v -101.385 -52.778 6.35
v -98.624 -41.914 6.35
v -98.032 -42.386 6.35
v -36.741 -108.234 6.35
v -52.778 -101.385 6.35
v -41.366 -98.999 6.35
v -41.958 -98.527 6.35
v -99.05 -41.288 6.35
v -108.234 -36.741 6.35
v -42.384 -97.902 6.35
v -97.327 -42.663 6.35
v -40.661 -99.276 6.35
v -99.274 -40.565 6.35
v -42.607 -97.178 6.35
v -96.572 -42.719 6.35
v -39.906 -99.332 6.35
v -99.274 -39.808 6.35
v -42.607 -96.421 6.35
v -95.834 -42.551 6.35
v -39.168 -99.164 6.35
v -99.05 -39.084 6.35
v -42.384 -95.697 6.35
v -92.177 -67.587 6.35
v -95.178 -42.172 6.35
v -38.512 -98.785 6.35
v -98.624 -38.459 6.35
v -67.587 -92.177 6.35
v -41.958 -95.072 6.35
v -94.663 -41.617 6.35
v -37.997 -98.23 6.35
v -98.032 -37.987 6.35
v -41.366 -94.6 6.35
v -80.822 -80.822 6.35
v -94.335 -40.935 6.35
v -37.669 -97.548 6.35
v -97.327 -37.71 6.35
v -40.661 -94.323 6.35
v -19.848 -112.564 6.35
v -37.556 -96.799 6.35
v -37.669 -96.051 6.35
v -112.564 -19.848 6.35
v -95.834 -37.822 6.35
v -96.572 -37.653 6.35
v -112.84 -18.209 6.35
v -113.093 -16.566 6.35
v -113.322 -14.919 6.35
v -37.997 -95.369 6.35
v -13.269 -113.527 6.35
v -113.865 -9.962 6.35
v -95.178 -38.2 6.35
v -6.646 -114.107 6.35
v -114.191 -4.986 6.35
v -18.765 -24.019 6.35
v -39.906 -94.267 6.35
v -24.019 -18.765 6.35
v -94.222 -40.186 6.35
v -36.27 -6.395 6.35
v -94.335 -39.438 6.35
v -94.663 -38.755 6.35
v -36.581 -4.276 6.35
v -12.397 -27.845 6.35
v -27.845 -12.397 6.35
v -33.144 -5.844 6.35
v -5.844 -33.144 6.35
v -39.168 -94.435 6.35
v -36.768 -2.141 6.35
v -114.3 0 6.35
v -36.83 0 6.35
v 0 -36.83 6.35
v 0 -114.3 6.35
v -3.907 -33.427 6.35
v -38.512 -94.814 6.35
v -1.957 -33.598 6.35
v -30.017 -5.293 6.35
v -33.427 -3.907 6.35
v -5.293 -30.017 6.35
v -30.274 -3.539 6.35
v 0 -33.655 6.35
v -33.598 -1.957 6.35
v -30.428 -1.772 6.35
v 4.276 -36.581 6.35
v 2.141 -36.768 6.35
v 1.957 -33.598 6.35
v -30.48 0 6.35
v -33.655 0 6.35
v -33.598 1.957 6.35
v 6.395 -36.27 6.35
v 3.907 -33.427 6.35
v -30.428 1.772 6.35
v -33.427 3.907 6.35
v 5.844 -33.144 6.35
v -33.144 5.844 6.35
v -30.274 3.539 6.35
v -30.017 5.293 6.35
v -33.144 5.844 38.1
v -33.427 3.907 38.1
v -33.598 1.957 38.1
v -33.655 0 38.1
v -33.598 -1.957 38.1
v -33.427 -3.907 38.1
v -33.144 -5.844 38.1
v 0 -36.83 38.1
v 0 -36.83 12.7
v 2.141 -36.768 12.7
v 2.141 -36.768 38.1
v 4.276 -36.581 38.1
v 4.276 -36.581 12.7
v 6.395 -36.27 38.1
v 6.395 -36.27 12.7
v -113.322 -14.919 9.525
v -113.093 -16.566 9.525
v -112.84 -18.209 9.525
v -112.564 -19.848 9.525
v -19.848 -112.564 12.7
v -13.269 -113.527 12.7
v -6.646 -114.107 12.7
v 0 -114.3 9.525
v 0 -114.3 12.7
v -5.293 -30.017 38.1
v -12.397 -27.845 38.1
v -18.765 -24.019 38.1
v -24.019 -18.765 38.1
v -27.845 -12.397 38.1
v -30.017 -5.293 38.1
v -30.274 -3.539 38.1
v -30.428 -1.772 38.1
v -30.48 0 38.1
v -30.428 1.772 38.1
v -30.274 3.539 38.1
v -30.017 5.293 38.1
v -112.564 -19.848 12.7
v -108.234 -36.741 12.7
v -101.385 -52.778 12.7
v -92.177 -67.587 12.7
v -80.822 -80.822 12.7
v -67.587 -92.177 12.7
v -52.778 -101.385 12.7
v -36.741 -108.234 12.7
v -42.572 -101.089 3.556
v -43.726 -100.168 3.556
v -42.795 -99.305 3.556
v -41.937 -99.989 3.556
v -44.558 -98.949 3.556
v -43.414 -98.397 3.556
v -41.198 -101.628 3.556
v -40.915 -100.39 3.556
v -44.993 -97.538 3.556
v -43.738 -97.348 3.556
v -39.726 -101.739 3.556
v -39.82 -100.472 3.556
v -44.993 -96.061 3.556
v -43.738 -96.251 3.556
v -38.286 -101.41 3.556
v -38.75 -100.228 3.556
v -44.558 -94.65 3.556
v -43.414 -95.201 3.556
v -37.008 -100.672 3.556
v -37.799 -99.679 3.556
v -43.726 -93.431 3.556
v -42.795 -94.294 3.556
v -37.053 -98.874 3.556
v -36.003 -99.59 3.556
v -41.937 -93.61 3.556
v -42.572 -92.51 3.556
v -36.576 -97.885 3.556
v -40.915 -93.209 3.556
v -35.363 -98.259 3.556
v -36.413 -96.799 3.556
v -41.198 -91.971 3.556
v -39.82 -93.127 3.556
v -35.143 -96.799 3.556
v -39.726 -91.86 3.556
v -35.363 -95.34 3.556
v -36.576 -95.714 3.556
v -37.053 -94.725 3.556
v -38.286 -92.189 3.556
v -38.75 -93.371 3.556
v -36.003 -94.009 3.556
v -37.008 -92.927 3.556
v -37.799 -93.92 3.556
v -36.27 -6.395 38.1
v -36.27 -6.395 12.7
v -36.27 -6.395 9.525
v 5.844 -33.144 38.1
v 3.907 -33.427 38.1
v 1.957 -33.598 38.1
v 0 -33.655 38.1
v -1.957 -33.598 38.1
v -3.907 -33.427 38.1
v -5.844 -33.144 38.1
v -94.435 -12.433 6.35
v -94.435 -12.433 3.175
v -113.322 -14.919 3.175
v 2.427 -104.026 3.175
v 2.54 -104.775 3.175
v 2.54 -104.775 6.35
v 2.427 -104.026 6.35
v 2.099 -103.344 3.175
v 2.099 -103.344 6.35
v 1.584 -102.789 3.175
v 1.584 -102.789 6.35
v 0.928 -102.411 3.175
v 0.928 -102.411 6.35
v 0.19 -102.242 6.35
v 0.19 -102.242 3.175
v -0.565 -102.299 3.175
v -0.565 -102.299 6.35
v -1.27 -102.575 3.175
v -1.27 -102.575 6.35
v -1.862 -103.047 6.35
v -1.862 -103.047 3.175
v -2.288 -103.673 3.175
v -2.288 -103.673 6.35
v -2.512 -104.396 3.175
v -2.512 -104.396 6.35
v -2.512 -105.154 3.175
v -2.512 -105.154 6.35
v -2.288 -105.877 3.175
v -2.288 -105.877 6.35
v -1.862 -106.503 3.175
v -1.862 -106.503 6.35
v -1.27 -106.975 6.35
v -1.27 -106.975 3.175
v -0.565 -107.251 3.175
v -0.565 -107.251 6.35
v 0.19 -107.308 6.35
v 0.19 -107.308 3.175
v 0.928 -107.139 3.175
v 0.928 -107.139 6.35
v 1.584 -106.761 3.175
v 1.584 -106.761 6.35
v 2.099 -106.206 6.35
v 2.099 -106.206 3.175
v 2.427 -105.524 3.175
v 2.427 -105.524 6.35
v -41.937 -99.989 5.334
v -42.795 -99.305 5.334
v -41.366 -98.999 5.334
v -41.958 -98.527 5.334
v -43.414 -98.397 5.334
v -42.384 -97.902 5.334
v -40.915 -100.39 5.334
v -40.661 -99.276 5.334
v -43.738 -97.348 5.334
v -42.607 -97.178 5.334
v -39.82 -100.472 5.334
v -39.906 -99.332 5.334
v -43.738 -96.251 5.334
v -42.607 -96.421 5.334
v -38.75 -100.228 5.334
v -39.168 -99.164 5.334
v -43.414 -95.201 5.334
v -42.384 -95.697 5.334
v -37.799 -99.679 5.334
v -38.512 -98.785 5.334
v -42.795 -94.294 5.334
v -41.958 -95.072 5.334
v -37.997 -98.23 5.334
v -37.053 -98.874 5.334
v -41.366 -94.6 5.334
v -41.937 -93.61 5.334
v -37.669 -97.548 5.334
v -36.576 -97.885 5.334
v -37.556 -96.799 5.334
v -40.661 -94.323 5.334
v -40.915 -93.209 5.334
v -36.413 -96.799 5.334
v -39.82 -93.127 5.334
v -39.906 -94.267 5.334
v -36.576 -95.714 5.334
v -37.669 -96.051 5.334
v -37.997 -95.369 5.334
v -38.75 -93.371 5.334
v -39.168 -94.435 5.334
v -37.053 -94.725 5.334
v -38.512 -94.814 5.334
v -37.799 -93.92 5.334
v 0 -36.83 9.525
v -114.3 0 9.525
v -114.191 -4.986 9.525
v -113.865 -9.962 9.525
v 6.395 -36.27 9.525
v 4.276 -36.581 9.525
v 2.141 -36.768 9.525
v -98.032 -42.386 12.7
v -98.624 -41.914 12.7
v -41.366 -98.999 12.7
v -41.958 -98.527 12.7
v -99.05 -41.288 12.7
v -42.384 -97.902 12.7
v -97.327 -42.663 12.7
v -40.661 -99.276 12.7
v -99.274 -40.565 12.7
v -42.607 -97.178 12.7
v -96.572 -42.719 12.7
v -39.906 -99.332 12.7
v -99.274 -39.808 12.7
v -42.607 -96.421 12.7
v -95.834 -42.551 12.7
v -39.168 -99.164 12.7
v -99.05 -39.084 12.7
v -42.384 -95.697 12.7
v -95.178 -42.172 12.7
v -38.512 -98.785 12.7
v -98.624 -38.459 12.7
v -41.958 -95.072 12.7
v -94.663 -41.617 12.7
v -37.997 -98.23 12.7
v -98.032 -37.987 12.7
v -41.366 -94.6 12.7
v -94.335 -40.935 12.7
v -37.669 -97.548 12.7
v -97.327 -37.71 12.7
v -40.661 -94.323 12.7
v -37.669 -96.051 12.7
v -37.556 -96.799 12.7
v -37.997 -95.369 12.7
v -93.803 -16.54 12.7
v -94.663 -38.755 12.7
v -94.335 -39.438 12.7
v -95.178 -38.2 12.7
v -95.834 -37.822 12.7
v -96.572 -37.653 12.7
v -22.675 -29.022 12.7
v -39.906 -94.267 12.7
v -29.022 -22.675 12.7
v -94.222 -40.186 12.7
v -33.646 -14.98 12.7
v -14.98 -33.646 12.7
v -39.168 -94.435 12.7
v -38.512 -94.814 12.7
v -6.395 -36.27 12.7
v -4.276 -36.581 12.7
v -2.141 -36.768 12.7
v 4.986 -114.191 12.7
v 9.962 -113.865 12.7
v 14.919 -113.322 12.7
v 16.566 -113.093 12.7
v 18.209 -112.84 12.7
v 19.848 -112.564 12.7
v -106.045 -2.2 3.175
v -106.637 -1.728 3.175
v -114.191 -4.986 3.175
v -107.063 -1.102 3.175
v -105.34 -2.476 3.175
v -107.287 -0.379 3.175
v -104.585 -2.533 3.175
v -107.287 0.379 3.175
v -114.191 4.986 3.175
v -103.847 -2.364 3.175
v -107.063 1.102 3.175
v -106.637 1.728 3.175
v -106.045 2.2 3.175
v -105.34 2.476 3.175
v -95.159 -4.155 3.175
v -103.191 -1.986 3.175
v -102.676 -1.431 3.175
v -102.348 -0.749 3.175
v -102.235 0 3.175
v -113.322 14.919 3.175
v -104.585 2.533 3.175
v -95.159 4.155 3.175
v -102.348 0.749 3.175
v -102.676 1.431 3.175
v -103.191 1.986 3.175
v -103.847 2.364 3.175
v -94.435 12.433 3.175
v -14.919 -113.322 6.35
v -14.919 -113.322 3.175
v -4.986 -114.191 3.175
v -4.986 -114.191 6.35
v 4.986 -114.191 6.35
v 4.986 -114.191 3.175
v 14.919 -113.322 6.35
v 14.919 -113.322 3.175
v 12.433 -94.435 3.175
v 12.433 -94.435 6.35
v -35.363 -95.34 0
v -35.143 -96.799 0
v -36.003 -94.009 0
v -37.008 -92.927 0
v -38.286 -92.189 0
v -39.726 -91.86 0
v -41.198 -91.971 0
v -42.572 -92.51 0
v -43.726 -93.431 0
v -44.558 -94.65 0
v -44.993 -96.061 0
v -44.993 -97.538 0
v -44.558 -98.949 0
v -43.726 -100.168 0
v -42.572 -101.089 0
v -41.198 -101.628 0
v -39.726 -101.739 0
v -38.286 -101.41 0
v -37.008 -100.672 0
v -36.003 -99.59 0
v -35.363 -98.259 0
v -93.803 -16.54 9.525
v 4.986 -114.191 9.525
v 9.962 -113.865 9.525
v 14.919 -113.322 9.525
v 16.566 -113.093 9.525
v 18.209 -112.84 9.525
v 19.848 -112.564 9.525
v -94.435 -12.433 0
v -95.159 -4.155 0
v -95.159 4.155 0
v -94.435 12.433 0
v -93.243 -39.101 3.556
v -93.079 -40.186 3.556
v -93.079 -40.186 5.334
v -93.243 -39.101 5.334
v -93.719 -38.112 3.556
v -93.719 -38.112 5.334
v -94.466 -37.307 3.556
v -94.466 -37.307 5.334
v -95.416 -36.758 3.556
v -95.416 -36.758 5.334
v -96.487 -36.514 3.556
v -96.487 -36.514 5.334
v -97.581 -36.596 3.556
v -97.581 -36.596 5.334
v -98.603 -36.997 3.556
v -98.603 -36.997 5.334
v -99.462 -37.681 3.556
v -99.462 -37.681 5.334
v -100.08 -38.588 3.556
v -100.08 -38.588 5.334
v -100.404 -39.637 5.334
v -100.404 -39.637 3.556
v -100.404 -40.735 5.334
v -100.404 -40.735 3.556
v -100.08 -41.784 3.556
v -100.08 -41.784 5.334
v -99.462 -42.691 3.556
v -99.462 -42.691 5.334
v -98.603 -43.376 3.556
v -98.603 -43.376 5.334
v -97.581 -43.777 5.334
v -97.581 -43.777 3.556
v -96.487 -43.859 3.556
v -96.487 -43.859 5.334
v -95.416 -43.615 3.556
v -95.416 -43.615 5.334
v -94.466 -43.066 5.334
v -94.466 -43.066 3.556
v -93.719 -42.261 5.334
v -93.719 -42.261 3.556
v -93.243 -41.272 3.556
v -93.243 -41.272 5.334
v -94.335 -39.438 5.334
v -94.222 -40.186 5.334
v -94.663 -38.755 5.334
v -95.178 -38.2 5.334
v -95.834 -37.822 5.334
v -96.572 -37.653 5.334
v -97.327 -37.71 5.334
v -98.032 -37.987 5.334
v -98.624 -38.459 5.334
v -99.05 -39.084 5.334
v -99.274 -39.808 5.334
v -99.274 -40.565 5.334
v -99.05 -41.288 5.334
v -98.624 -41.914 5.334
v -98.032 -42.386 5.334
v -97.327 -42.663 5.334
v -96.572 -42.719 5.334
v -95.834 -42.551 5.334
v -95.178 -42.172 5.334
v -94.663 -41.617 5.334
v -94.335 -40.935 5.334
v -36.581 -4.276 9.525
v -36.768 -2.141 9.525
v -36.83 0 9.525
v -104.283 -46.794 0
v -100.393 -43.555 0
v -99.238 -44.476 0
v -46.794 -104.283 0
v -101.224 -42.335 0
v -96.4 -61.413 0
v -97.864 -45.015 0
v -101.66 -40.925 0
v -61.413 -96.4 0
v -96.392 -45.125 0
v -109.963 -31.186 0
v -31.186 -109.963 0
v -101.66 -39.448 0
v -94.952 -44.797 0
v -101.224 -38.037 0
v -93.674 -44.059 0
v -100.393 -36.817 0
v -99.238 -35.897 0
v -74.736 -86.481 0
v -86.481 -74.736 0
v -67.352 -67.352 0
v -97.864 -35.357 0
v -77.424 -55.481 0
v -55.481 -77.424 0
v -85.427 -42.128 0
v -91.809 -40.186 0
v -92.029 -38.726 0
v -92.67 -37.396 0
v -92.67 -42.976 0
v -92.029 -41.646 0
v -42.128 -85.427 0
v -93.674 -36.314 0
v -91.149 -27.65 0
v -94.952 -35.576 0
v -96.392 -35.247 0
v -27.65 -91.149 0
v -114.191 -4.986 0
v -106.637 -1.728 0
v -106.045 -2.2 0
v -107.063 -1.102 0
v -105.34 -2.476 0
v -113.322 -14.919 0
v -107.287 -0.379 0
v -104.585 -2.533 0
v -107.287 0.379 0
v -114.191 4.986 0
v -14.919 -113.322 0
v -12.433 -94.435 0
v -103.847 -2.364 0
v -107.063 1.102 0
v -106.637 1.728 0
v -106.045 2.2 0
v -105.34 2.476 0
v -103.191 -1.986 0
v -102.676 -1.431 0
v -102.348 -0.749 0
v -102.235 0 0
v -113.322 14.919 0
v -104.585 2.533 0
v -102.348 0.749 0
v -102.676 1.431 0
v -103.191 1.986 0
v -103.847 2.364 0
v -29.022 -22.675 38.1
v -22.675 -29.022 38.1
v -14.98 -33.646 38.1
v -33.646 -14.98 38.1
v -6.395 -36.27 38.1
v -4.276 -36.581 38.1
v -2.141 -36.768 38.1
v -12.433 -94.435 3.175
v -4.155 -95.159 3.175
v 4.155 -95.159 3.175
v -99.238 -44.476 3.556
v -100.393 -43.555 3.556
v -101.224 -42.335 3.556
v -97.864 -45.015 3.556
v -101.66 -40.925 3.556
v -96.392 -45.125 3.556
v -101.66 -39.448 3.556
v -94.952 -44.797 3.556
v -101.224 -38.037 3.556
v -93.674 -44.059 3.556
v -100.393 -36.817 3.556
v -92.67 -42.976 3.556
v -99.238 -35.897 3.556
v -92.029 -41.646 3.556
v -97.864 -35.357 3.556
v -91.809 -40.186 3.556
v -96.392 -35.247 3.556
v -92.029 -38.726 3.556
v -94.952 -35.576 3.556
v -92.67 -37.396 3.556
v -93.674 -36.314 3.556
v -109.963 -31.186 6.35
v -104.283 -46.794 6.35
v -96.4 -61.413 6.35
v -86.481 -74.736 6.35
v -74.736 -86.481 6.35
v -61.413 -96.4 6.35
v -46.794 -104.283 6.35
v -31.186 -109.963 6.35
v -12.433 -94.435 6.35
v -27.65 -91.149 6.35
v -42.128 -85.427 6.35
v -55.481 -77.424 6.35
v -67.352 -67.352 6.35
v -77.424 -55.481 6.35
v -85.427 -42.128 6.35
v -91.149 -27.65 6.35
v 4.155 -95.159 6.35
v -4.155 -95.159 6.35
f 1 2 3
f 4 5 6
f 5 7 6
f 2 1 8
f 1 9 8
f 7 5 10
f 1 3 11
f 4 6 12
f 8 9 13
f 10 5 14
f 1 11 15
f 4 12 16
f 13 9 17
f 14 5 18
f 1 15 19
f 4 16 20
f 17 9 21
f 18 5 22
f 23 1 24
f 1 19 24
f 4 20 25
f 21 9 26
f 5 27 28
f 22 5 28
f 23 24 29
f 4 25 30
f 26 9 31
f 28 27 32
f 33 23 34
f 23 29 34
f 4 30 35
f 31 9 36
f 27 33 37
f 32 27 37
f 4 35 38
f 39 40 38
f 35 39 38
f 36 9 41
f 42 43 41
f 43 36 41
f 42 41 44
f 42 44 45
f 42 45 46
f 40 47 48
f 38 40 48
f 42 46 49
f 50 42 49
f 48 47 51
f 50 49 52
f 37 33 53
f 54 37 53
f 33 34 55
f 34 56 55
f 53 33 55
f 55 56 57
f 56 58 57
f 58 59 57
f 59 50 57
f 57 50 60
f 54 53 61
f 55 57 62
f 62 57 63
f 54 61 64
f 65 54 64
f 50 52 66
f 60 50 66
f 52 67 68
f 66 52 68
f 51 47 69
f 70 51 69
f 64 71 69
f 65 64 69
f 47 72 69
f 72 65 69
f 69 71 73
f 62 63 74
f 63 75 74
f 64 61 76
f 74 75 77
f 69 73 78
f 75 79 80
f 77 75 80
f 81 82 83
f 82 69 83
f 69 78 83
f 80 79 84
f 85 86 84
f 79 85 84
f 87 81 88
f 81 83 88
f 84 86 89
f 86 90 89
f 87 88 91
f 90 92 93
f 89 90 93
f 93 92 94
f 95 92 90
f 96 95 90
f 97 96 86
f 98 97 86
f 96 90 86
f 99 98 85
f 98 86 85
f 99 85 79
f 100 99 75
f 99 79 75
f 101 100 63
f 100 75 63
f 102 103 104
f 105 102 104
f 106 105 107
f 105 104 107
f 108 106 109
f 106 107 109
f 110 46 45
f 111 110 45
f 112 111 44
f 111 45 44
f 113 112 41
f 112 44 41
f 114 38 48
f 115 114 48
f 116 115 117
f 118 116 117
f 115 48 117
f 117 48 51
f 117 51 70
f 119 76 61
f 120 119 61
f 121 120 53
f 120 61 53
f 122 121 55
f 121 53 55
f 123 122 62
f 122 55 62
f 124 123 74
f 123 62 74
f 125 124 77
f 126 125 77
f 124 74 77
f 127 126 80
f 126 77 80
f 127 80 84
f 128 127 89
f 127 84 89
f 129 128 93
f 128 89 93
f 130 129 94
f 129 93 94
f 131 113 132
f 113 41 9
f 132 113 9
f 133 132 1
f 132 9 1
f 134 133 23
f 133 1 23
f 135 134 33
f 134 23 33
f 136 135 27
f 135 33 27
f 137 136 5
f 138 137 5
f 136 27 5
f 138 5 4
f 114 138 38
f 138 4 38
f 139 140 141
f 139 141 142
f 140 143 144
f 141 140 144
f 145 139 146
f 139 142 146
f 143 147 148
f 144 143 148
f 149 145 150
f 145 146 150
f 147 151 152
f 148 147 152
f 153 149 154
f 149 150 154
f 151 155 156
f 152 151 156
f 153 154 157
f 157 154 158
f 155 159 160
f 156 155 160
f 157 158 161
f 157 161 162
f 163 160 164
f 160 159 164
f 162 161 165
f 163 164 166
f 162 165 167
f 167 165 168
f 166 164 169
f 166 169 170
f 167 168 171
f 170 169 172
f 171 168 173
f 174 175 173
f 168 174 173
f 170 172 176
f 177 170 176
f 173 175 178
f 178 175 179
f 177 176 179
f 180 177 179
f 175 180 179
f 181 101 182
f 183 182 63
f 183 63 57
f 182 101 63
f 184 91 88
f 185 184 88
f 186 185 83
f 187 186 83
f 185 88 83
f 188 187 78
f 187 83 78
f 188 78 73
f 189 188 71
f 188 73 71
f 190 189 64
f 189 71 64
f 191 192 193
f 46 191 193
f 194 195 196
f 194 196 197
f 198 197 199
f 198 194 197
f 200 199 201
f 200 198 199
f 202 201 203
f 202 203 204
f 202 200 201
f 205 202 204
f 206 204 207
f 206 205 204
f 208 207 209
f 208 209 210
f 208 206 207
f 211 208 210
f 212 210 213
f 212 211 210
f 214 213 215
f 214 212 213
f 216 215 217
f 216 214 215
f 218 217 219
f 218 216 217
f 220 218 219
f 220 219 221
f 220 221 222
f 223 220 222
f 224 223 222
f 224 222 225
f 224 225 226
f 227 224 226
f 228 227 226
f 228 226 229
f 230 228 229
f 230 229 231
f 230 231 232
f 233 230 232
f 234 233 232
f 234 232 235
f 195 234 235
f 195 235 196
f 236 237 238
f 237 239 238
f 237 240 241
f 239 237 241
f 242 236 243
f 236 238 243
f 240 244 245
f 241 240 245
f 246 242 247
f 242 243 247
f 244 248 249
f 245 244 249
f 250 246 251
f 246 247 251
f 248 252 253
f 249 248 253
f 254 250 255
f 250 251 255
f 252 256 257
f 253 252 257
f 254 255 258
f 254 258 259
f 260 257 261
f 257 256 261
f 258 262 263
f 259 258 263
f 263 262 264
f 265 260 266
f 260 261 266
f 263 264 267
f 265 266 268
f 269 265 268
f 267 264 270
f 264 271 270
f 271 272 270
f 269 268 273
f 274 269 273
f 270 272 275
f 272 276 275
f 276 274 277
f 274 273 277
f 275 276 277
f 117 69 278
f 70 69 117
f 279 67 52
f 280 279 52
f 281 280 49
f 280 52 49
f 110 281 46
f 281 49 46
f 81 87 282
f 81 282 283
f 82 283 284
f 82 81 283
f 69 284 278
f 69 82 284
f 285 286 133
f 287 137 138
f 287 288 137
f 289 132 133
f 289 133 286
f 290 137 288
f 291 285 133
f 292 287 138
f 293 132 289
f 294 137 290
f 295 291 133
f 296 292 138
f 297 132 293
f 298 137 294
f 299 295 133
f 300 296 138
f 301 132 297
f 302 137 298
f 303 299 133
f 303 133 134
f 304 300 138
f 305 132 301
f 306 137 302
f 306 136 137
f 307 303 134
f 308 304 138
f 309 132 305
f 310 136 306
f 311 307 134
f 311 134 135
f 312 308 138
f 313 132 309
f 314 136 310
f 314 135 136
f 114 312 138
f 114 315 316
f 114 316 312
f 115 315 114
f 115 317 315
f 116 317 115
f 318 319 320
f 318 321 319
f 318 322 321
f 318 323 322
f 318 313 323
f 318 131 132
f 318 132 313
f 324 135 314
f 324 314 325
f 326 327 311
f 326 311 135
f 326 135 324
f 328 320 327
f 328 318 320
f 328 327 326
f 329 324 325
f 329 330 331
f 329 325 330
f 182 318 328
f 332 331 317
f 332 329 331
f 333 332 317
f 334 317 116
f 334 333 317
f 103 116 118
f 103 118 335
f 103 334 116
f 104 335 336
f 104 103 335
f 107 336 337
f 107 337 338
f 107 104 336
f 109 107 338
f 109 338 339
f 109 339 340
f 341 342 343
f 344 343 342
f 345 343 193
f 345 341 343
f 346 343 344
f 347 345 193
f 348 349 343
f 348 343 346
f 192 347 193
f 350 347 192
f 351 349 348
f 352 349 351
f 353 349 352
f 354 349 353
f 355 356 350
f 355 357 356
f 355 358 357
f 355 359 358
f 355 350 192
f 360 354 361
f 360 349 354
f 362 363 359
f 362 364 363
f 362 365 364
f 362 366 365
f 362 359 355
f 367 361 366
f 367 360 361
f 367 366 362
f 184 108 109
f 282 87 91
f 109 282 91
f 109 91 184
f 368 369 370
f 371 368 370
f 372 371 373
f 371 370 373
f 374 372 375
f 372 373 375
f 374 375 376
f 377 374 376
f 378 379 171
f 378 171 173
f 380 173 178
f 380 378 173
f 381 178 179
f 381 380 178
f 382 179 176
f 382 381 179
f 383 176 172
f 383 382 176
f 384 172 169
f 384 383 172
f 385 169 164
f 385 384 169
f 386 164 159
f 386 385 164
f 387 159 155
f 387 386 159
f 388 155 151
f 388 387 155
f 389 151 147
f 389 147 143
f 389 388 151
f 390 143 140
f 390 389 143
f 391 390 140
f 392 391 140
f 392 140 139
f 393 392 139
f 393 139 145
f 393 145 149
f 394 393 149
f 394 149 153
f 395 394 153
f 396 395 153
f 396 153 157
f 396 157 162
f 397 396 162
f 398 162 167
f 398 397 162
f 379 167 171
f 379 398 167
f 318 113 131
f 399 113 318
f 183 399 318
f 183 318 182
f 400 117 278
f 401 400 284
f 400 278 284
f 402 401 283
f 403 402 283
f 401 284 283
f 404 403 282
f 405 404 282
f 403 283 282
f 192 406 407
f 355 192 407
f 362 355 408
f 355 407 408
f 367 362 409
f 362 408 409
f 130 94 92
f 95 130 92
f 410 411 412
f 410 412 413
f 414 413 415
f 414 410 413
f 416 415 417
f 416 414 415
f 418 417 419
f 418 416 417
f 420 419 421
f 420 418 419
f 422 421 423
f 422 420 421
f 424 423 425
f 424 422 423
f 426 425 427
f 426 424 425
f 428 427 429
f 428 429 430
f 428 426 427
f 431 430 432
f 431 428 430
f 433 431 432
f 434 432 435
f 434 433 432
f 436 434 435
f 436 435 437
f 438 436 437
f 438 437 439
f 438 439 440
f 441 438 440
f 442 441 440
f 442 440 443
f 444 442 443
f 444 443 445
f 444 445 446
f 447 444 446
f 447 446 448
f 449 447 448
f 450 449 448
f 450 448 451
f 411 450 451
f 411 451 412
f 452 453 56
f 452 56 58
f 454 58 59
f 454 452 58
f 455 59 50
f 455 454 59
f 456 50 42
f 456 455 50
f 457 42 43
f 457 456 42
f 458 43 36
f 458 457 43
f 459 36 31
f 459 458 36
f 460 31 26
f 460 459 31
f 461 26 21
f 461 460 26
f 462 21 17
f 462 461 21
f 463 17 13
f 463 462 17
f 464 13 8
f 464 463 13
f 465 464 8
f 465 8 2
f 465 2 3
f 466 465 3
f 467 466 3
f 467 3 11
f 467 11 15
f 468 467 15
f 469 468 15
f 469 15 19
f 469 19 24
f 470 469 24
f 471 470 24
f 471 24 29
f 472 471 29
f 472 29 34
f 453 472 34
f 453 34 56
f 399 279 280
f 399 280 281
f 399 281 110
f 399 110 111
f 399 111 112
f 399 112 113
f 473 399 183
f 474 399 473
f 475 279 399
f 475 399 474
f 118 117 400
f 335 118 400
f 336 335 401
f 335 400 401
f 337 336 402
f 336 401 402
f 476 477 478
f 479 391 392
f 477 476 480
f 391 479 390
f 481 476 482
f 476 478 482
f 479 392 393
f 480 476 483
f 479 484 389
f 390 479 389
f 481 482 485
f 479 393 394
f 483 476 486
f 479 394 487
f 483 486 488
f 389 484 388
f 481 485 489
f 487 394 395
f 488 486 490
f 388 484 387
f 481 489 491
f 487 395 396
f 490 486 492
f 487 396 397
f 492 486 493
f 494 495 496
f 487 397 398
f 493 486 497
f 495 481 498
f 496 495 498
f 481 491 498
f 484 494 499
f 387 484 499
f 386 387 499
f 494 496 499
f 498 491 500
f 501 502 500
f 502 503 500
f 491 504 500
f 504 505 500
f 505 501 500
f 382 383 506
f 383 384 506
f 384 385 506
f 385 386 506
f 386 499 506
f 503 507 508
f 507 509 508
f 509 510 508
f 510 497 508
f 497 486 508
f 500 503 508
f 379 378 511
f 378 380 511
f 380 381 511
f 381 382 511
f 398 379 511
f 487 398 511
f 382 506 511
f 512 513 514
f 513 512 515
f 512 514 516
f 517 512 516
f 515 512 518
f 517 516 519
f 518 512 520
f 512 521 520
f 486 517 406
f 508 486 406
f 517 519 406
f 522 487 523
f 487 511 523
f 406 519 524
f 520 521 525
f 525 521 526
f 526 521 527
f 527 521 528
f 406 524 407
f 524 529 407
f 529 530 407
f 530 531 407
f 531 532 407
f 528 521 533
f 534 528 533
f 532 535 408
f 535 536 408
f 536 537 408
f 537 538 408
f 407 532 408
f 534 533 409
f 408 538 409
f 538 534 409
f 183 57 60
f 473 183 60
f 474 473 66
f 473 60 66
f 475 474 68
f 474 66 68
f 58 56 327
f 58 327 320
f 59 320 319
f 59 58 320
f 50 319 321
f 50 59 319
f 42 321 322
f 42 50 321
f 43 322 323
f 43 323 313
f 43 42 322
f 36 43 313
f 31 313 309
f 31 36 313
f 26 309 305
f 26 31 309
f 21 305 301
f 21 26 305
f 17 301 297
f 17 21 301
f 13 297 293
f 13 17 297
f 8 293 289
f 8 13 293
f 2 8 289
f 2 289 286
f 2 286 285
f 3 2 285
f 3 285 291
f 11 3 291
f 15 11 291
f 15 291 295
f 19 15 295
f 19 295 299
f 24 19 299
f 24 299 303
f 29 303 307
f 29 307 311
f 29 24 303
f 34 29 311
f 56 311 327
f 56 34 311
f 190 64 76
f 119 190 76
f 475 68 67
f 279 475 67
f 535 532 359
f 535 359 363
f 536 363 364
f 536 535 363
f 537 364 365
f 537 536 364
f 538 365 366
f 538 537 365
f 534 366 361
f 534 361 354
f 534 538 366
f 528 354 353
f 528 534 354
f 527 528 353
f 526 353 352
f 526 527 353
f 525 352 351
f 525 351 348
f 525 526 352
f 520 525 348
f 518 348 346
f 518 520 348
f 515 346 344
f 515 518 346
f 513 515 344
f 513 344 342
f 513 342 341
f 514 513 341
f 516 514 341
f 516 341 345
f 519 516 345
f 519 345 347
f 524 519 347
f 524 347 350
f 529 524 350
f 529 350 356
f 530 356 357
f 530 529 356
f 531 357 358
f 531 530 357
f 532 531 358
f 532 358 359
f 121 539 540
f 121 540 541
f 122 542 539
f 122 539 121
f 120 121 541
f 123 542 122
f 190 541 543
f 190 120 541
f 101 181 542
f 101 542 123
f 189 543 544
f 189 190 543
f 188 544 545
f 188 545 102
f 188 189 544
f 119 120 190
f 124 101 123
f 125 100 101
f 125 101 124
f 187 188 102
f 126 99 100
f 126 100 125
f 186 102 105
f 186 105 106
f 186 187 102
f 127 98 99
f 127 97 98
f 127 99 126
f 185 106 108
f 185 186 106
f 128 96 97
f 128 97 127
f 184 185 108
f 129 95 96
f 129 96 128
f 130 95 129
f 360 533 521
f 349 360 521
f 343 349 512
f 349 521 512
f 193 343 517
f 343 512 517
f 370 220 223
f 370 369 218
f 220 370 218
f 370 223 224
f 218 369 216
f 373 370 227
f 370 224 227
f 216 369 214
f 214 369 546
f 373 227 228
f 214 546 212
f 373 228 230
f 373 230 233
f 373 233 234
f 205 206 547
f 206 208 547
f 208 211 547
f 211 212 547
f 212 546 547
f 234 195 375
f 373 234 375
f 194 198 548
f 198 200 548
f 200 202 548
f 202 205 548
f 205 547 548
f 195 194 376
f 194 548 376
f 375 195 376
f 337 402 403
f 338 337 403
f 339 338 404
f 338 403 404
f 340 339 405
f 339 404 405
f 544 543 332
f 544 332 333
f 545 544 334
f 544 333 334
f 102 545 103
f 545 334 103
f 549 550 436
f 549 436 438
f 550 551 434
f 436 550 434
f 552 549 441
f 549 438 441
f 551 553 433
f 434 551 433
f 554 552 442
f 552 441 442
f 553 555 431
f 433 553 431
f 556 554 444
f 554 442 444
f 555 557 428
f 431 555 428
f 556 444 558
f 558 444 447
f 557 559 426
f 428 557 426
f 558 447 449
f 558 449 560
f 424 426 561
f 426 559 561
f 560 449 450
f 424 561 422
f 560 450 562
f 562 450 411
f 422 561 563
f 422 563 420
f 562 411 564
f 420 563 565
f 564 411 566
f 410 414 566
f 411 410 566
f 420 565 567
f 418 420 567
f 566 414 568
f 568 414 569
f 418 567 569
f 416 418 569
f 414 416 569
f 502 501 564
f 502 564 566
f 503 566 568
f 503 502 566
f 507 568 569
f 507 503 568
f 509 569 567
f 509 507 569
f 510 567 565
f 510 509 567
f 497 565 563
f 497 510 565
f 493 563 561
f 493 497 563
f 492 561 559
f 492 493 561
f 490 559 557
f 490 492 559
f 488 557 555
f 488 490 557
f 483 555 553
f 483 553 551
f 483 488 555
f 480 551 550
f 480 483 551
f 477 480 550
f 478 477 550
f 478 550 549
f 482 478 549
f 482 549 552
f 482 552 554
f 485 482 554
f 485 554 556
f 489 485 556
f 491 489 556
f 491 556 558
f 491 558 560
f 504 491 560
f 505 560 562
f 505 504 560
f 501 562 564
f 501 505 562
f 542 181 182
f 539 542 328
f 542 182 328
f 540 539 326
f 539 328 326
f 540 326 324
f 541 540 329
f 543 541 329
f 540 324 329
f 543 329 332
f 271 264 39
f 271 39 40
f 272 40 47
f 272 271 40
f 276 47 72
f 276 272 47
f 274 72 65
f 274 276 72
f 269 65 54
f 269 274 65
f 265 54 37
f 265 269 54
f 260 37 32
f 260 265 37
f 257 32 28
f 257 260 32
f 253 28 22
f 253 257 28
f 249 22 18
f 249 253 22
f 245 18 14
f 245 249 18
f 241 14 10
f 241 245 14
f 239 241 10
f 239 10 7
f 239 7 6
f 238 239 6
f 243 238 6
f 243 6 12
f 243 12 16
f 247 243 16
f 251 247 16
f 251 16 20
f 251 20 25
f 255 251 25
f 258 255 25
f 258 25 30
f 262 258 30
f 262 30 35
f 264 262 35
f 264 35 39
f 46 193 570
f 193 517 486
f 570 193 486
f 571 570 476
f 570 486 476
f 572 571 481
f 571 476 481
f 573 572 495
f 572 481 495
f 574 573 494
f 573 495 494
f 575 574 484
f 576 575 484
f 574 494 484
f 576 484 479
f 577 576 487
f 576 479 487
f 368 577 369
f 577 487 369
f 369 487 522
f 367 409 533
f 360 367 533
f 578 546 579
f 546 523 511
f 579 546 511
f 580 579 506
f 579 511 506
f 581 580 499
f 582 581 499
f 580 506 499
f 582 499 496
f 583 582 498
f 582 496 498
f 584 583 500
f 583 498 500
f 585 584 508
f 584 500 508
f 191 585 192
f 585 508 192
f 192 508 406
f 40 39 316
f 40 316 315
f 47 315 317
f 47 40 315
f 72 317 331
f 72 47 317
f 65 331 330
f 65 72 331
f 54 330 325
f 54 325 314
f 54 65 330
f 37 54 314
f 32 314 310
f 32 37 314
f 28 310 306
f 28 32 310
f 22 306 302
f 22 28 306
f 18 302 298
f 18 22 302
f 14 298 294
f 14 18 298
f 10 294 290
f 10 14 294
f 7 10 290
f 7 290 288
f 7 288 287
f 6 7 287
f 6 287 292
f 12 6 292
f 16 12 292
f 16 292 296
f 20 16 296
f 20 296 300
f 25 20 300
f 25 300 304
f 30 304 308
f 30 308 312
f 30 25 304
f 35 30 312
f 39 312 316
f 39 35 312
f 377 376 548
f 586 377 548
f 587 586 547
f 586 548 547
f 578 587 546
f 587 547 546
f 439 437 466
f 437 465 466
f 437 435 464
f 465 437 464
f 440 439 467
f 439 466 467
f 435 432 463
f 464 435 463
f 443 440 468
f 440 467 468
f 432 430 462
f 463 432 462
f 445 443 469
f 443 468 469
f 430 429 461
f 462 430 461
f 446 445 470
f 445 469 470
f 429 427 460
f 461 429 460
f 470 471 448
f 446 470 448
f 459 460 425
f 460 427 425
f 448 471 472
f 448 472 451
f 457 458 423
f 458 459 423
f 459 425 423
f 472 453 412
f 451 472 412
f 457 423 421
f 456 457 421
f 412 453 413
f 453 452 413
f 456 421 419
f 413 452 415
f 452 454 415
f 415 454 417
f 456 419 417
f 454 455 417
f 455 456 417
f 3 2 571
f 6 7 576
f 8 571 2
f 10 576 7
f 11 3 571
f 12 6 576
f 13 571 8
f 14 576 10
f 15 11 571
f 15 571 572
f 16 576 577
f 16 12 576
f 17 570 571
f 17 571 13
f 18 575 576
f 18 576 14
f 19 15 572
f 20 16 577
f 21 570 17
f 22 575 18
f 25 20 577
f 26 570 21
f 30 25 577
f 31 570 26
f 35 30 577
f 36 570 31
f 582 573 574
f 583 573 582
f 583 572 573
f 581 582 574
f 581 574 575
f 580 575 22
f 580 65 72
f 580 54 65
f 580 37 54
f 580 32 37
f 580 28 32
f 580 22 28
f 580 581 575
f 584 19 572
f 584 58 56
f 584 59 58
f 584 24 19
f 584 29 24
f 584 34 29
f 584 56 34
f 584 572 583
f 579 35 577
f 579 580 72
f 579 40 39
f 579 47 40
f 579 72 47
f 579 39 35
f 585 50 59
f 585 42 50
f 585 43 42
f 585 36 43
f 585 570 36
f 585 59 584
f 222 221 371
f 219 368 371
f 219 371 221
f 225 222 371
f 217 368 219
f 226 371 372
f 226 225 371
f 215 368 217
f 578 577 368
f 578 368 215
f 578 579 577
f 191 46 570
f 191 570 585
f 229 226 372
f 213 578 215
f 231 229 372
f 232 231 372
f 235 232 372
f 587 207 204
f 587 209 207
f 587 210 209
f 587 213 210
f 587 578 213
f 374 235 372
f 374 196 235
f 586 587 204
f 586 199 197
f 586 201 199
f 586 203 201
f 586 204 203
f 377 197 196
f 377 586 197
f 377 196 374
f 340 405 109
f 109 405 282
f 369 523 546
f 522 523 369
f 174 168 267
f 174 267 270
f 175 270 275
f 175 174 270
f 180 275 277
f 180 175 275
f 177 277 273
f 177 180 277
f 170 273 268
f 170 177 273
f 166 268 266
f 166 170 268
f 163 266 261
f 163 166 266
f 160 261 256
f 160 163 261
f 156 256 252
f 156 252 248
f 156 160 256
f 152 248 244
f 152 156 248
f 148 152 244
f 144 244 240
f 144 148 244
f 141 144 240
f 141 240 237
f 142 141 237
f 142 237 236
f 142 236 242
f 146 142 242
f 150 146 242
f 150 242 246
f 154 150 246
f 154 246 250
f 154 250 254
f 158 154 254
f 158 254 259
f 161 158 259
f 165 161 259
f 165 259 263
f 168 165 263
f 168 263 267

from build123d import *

# Parameters (mm, degrees)
F0_R      = 4.953
F0_R_2    = 3.683
F0_R_3    = 2.54
F1_DEPTH  = 6.35
F2_DEPTH  = 3.175
F3_DEPTH  = 6.35
F4_DEPTH  = 3.175
F5_DEPTH  = 3.556
F6_DEPTH  = 3.556
F7_DEPTH  = 5.334
F8_DEPTH  = 5.334
F9_DEPTH  = 25.4
F10_R     = 2.54
F11_DEPTH = 6.35
F12_DEPTH = 31.75
F13_DEPTH = 6.35
F14_DEPTH = 3.175
F15_DEPTH = 6.35
F16_DEPTH = 3.175


with BuildPart() as f1:
    # F0 (on Top) → F1 (new body)
    with BuildSketch(Plane.XY):
        with BuildLine():
            Line((-94.4351230459, -12.432619809), (-113.322147655, -14.9191437708))
            ThreePointArc((-113.322147655, -14.9191437708), (-80.8223050896, -80.8223050896), (-14.9191437708, -113.322147655))
            Line((-14.9191437708, -113.322147655), (-12.432619809, -94.4351230459))
            ThreePointArc((-12.432619809, -94.4351230459), (-67.351920908, -67.351920908), (-94.4351230459, -12.432619809))
        make_face()
        with Locations((-40.0956566261, -96.7994780189)):
            Circle(F0_R, mode=Mode.SUBTRACT)
        with Locations((-96.7618797455, -40.1863067863)):
            Circle(F0_R, mode=Mode.SUBTRACT)
        with Locations((-96.7618797455, -40.1863067863)):
            Circle(F0_R)
        with Locations((-96.7618797455, -40.1863067863)):
            Circle(F0_R_2, mode=Mode.SUBTRACT)
        with Locations((-96.7618797455, -40.1863067863)):
            Circle(F0_R_2)
        with Locations((-96.7618797455, -40.1863067863)):
            Circle(F0_R_3, mode=Mode.SUBTRACT)
        with Locations((-40.0956566261, -96.7994780189)):
            Circle(F0_R)
        with Locations((-40.0956566261, -96.7994780189)):
            Circle(F0_R_2, mode=Mode.SUBTRACT)
        with Locations((-40.0956566261, -96.7994780189)):
            Circle(F0_R_2)
        with Locations((-40.0956566261, -96.7994780189)):
            Circle(F0_R_3, mode=Mode.SUBTRACT)
    extrude(amount=F1_DEPTH)

    # F0 (on Top) → F2 (join)
    with BuildSketch(Plane.XY):
        with BuildLine():
            Line((-94.4351230459, 12.432619809), (-113.322147655, 14.9191437708))
            ThreePointArc((-113.322147655, 14.9191437708), (-114.3, 0), (-113.322147655, -14.9191437708))
            Line((-113.322147655, -14.9191437708), (-94.4351230459, -12.432619809))
            ThreePointArc((-94.4351230459, -12.432619809), (-95.25, 0), (-94.4351230459, 12.432619809))
        make_face()
        with Locations((-104.775, 0)):
            Circle(F0_R_3, mode=Mode.SUBTRACT)
    extrude(amount=F2_DEPTH)

    # F0 (on Top) → F3 (join)
    with BuildSketch(Plane.XY):
        with BuildLine():
            ThreePointArc((-14.9191437708, -113.322147655), (0, -114.3), (14.9191437708, -113.322147655))
            Line((14.9191437708, -113.322147655), (12.432619809, -94.4351230459))
            ThreePointArc((12.432619809, -94.4351230459), (0, -95.25), (-12.432619809, -94.4351230459))
            Line((-12.432619809, -94.4351230459), (-14.9191437708, -113.322147655))
        make_face()
        with Locations((0, -104.775)):
            Circle(F0_R_3, mode=Mode.SUBTRACT)
    extrude(amount=F3_DEPTH)

    # F0 (on Top) → F4 (cut)
    with BuildSketch(Plane.XY):
        with BuildLine():
            ThreePointArc((-14.9191437708, -113.322147655), (0, -114.3), (14.9191437708, -113.322147655))
            Line((14.9191437708, -113.322147655), (12.432619809, -94.4351230459))
            ThreePointArc((12.432619809, -94.4351230459), (0, -95.25), (-12.432619809, -94.4351230459))
            Line((-12.432619809, -94.4351230459), (-14.9191437708, -113.322147655))
        make_face()
        with Locations((0, -104.775)):
            Circle(F0_R_3, mode=Mode.SUBTRACT)
    extrude(amount=F4_DEPTH, mode=Mode.SUBTRACT)

    # F0 (on Top) → F5 (cut)
    with BuildSketch(Plane.XY):
        with Locations((-40.0956566261, -96.7994780189)):
            Circle(F0_R)
        with Locations((-40.0956566261, -96.7994780189)):
            Circle(F0_R_2, mode=Mode.SUBTRACT)
        with Locations((-40.0956566261, -96.7994780189)):
            Circle(F0_R_2)
        with Locations((-40.0956566261, -96.7994780189)):
            Circle(F0_R_3, mode=Mode.SUBTRACT)
    extrude(amount=F5_DEPTH, mode=Mode.SUBTRACT)

    # F0 (on Top) → F6 (cut)
    with BuildSketch(Plane.XY):
        with Locations((-96.7618797455, -40.1863067863)):
            Circle(F0_R)
        with Locations((-96.7618797455, -40.1863067863)):
            Circle(F0_R_2, mode=Mode.SUBTRACT)
        with Locations((-96.7618797455, -40.1863067863)):
            Circle(F0_R_2)
        with Locations((-96.7618797455, -40.1863067863)):
            Circle(F0_R_3, mode=Mode.SUBTRACT)
    extrude(amount=F6_DEPTH, mode=Mode.SUBTRACT)

    # F0 (on Top) → F7 (cut)
    with BuildSketch(Plane.XY):
        with Locations((-96.7618797455, -40.1863067863)):
            Circle(F0_R_2)
        with Locations((-96.7618797455, -40.1863067863)):
            Circle(F0_R_3, mode=Mode.SUBTRACT)
    extrude(amount=F7_DEPTH, mode=Mode.SUBTRACT)

    # F0 (on Top) → F8 (cut)
    with BuildSketch(Plane.XY):
        with Locations((-40.0956566261, -96.7994780189)):
            Circle(F0_R_2)
        with Locations((-40.0956566261, -96.7994780189)):
            Circle(F0_R_3, mode=Mode.SUBTRACT)
    extrude(amount=F8_DEPTH, mode=Mode.SUBTRACT)

    # F0 (on Top) → F9 (cut)
    with BuildSketch(Plane.XY):
        with Locations((-96.7618797455, -40.1863067863)):
            Circle(F0_R_3)
    extrude(amount=F9_DEPTH, mode=Mode.SUBTRACT)


with BuildPart() as f11:
    # F10 (on face) → F11 (new body)
    with BuildSketch(Plane.XY.offset(6.35)):
        with BuildLine():
            Line((-36.83, 0), (-114.3, 0))
            ThreePointArc((-114.3, 0), (-114.0552749262, -7.475577671), (-113.322147655, -14.9191437708))
            Line((-113.322147655, -14.9191437708), (-94.4351230459, -12.432619809))
            ThreePointArc((-94.4351230459, -12.432619809), (-94.1414338721, -14.4897525346), (-93.8029384744, -16.5399889228))
            Line((-93.8029384744, -16.5399889228), (-36.2704695434, -6.3954623835))
            ThreePointArc((-36.2704695434, -6.3954623835), (-36.6898507307, -3.2099460054), (-36.83, 0))
        make_face()
        with BuildLine():
            Line((-93.8029384744, -16.5399889228), (-112.5635261693, -19.8479867073))
            ThreePointArc((-112.5635261693, -19.8479867073), (-80.8223050896, -80.8223050896), (-19.8479867073, -112.5635261693))
            Line((-19.8479867073, -112.5635261693), (-16.5399889228, -93.8029384744))
            ThreePointArc((-16.5399889228, -93.8029384744), (-67.351920908, -67.351920908), (-93.8029384744, -16.5399889228))
        make_face()
        with Locations((-40.0956566261, -96.7994780189)):
            Circle(F10_R, mode=Mode.SUBTRACT)
        with Locations((-96.7618797455, -40.1863067863)):
            Circle(F10_R, mode=Mode.SUBTRACT)
        with BuildLine():
            ThreePointArc((-6.3954623835, -36.2704695434), (-26.0427427511, -26.0427427511), (-36.2704695434, -6.3954623835))
            Line((-36.2704695434, -6.3954623835), (-93.8029384744, -16.5399889228))
            ThreePointArc((-93.8029384744, -16.5399889228), (-67.351920908, -67.351920908), (-16.5399889228, -93.8029384744))
            Line((-16.5399889228, -93.8029384744), (-6.3954623835, -36.2704695434))
        make_face()
        with BuildLine():
            Line((-33.1437049276, -5.8441294194), (-36.2704695434, -6.3954623835))
            ThreePointArc((-36.2704695434, -6.3954623835), (-26.0427427511, -26.0427427511), (-6.3954623835, -36.2704695434))
            Line((-6.3954623835, -36.2704695434), (-5.8441294194, -33.1437049276))
            ThreePointArc((-5.8441294194, -33.1437049276), (-23.7976787208, -23.7976787208), (-33.1437049276, -5.8441294194))
        make_face()
        with BuildLine():
            Line((-30.0169403118, -5.2927964553), (-33.1437049276, -5.8441294194))
            ThreePointArc((-33.1437049276, -5.8441294194), (-23.7976787208, -23.7976787208), (-5.8441294194, -33.1437049276))
            Line((-5.8441294194, -33.1437049276), (-5.2927964553, -30.0169403118))
            ThreePointArc((-5.2927964553, -30.0169403118), (-21.5526146906, -21.5526146906), (-30.0169403118, -5.2927964553))
        make_face()
        with BuildLine():
            Line((0, -95.25), (0, -36.83))
            ThreePointArc((0, -36.83), (-3.2099460054, -36.6898507307), (-6.3954623835, -36.2704695434))
            Line((-6.3954623835, -36.2704695434), (-16.5399889228, -93.8029384744))
            ThreePointArc((-16.5399889228, -93.8029384744), (-8.3015844967, -94.8875449932), (0, -95.25))
        make_face()
        with BuildLine():
            ThreePointArc((-6.3954623835, -36.2704695434), (-3.2099460054, -36.6898507307), (0, -36.83))
            Line((0, -36.83), (0, -33.655))
            ThreePointArc((0, -33.655), (-2.9332265222, -33.5269325643), (-5.8441294194, -33.1437049276))
            Line((-5.8441294194, -33.1437049276), (-6.3954623835, -36.2704695434))
        make_face()
        with BuildLine():
            Line((-30.48, 0), (-33.655, 0))
            ThreePointArc((-33.655, 0), (-33.5269325643, -2.9332265222), (-33.1437049276, -5.8441294194))
            Line((-33.1437049276, -5.8441294194), (-30.0169403118, -5.2927964553))
            ThreePointArc((-30.0169403118, -5.2927964553), (-30.3640143978, -2.6565070389), (-30.48, 0))
        make_face()
        with BuildLine():
            Line((-94.4351230459, -12.432619809), (-113.322147655, -14.9191437708))
            ThreePointArc((-113.322147655, -14.9191437708), (-112.9697206465, -17.3877030415), (-112.5635261693, -19.8479867073))
            Line((-112.5635261693, -19.8479867073), (-93.8029384744, -16.5399889228))
            ThreePointArc((-93.8029384744, -16.5399889228), (-94.1414338721, -14.4897525346), (-94.4351230459, -12.432619809))
        make_face()
        with BuildLine():
            ThreePointArc((-19.8479867073, -112.5635261693), (-9.9619013961, -113.8650539919), (0, -114.3))
            Line((0, -114.3), (0, -107.315))
            ThreePointArc((0, -107.315), (-2.54, -104.775), (0, -102.235))
            Line((0, -102.235), (0, -95.25))
            ThreePointArc((0, -95.25), (-8.3015844967, -94.8875449932), (-16.5399889228, -93.8029384744))
            Line((-16.5399889228, -93.8029384744), (-19.8479867073, -112.5635261693))
        make_face()
        with BuildLine():
            ThreePointArc((0, -102.235), (-2.54, -104.775), (0, -107.315))
            Line((0, -107.315), (0, -102.235))
        make_face()
    extrude(amount=F11_DEPTH)

    # F10 (on face) → F12 (join)
    with BuildSketch(Plane.XY.offset(6.35)):
        with BuildLine():
            Line((-30.48, 0), (-33.655, 0))
            ThreePointArc((-33.655, 0), (-33.5269325643, -2.9332265222), (-33.1437049276, -5.8441294194))
            Line((-33.1437049276, -5.8441294194), (-30.0169403118, -5.2927964553))
            ThreePointArc((-30.0169403118, -5.2927964553), (-30.3640143978, -2.6565070389), (-30.48, 0))
        make_face()
        with BuildLine():
            Line((-33.1437049276, -5.8441294194), (-36.2704695434, -6.3954623835))
            ThreePointArc((-36.2704695434, -6.3954623835), (-26.0427427511, -26.0427427511), (-6.3954623835, -36.2704695434))
            Line((-6.3954623835, -36.2704695434), (-5.8441294194, -33.1437049276))
            ThreePointArc((-5.8441294194, -33.1437049276), (-23.7976787208, -23.7976787208), (-33.1437049276, -5.8441294194))
        make_face()
        with BuildLine():
            Line((-30.0169403118, -5.2927964553), (-33.1437049276, -5.8441294194))
            ThreePointArc((-33.1437049276, -5.8441294194), (-23.7976787208, -23.7976787208), (-5.8441294194, -33.1437049276))
            Line((-5.8441294194, -33.1437049276), (-5.2927964553, -30.0169403118))
            ThreePointArc((-5.2927964553, -30.0169403118), (-21.5526146906, -21.5526146906), (-30.0169403118, -5.2927964553))
        make_face()
        with BuildLine():
            ThreePointArc((-6.3954623835, -36.2704695434), (-3.2099460054, -36.6898507307), (0, -36.83))
            Line((0, -36.83), (0, -33.655))
            ThreePointArc((0, -33.655), (-2.9332265222, -33.5269325643), (-5.8441294194, -33.1437049276))
            Line((-5.8441294194, -33.1437049276), (-6.3954623835, -36.2704695434))
        make_face()
        with BuildLine():
            Line((-30.0169403118, 5.2927964553), (-33.1437049276, 5.8441294194))
            ThreePointArc((-33.1437049276, 5.8441294194), (-33.5269325643, 2.9332265222), (-33.655, 0))
            Line((-33.655, 0), (-30.48, 0))
            ThreePointArc((-30.48, 0), (-30.3640143978, 2.6565070389), (-30.0169403118, 5.2927964553))
        make_face()
        with BuildLine():
            ThreePointArc((0, -36.83), (3.2099460054, -36.6898507307), (6.3954623835, -36.2704695434))
            Line((6.3954623835, -36.2704695434), (5.8441294194, -33.1437049276))
            ThreePointArc((5.8441294194, -33.1437049276), (2.9332265222, -33.5269325643), (0, -33.655))
            Line((0, -33.655), (0, -36.83))
        make_face()
    extrude(amount=F12_DEPTH)

    # F10 (on face) → F13 (join)
    with BuildSketch(Plane.XY.offset(6.35)):
        with BuildLine():
            Line((0, -102.235), (0, -107.315))
            ThreePointArc((0, -107.315), (1.7960512242, -106.5710512242), (2.54, -104.775))
            ThreePointArc((2.54, -104.775), (1.7960512242, -102.9789487758), (0, -102.235))
        make_face()
        with BuildLine():
            ThreePointArc((0, -114.3), (7.475577671, -114.0552749262), (14.9191437708, -113.322147655))
            Line((14.9191437708, -113.322147655), (12.432619809, -94.4351230459))
            ThreePointArc((12.432619809, -94.4351230459), (6.2296480592, -95.0460624385), (0, -95.25))
            Line((0, -95.25), (0, -102.235))
            ThreePointArc((0, -102.235), (1.7960512242, -102.9789487758), (2.54, -104.775))
            ThreePointArc((2.54, -104.775), (1.7960512242, -106.5710512242), (0, -107.315))
            Line((0, -107.315), (0, -114.3))
        make_face()
        with BuildLine():
            ThreePointArc((14.9191437708, -113.322147655), (17.3877030415, -112.9697206465), (19.8479867073, -112.5635261693))
            Line((19.8479867073, -112.5635261693), (6.3954623835, -36.2704695434))
            ThreePointArc((6.3954623835, -36.2704695434), (3.2099460054, -36.6898507307), (0, -36.83))
            Line((0, -36.83), (0, -95.25))
            ThreePointArc((0, -95.25), (6.2296480592, -95.0460624385), (12.432619809, -94.4351230459))
            Line((12.432619809, -94.4351230459), (14.9191437708, -113.322147655))
        make_face()
    extrude(amount=F13_DEPTH)

    # F10 (on face) → F14 (cut)
    with BuildSketch(Plane.XY.offset(6.35)):
        with BuildLine():
            Line((0, -102.235), (0, -107.315))
            ThreePointArc((0, -107.315), (1.7960512242, -106.5710512242), (2.54, -104.775))
            ThreePointArc((2.54, -104.775), (1.7960512242, -102.9789487758), (0, -102.235))
        make_face()
        with BuildLine():
            ThreePointArc((0, -114.3), (7.475577671, -114.0552749262), (14.9191437708, -113.322147655))
            Line((14.9191437708, -113.322147655), (12.432619809, -94.4351230459))
            ThreePointArc((12.432619809, -94.4351230459), (6.2296480592, -95.0460624385), (0, -95.25))
            Line((0, -95.25), (0, -102.235))
            ThreePointArc((0, -102.235), (1.7960512242, -102.9789487758), (2.54, -104.775))
            ThreePointArc((2.54, -104.775), (1.7960512242, -106.5710512242), (0, -107.315))
            Line((0, -107.315), (0, -114.3))
        make_face()
        with BuildLine():
            ThreePointArc((14.9191437708, -113.322147655), (17.3877030415, -112.9697206465), (19.8479867073, -112.5635261693))
            Line((19.8479867073, -112.5635261693), (6.3954623835, -36.2704695434))
            ThreePointArc((6.3954623835, -36.2704695434), (3.2099460054, -36.6898507307), (0, -36.83))
            Line((0, -36.83), (0, -95.25))
            ThreePointArc((0, -95.25), (6.2296480592, -95.0460624385), (12.432619809, -94.4351230459))
            Line((12.432619809, -94.4351230459), (14.9191437708, -113.322147655))
        make_face()
    extrude(amount=F14_DEPTH, mode=Mode.SUBTRACT)

    # F10 (on face) → F15 (cut)
    with BuildSketch(Plane.XY.offset(6.35)):
        with BuildLine():
            Line((-36.83, 0), (-114.3, 0))
            ThreePointArc((-114.3, 0), (-114.0552749262, -7.475577671), (-113.322147655, -14.9191437708))
            Line((-113.322147655, -14.9191437708), (-94.4351230459, -12.432619809))
            ThreePointArc((-94.4351230459, -12.432619809), (-94.1414338721, -14.4897525346), (-93.8029384744, -16.5399889228))
            Line((-93.8029384744, -16.5399889228), (-36.2704695434, -6.3954623835))
            ThreePointArc((-36.2704695434, -6.3954623835), (-36.6898507307, -3.2099460054), (-36.83, 0))
        make_face()
        with BuildLine():
            Line((-94.4351230459, -12.432619809), (-113.322147655, -14.9191437708))
            ThreePointArc((-113.322147655, -14.9191437708), (-112.9697206465, -17.3877030415), (-112.5635261693, -19.8479867073))
            Line((-112.5635261693, -19.8479867073), (-93.8029384744, -16.5399889228))
            ThreePointArc((-93.8029384744, -16.5399889228), (-94.1414338721, -14.4897525346), (-94.4351230459, -12.432619809))
        make_face()
    extrude(amount=F15_DEPTH, mode=Mode.SUBTRACT)

    # F10 (on face) → F16 (join)
    with BuildSketch(Plane.XY.offset(6.35)):
        with BuildLine():
            Line((-36.83, 0), (-114.3, 0))
            ThreePointArc((-114.3, 0), (-114.0552749262, -7.475577671), (-113.322147655, -14.9191437708))
            Line((-113.322147655, -14.9191437708), (-94.4351230459, -12.432619809))
            ThreePointArc((-94.4351230459, -12.432619809), (-94.1414338721, -14.4897525346), (-93.8029384744, -16.5399889228))
            Line((-93.8029384744, -16.5399889228), (-36.2704695434, -6.3954623835))
            ThreePointArc((-36.2704695434, -6.3954623835), (-36.6898507307, -3.2099460054), (-36.83, 0))
        make_face()
        with BuildLine():
            Line((-94.4351230459, -12.432619809), (-113.322147655, -14.9191437708))
            ThreePointArc((-113.322147655, -14.9191437708), (-112.9697206465, -17.3877030415), (-112.5635261693, -19.8479867073))
            Line((-112.5635261693, -19.8479867073), (-93.8029384744, -16.5399889228))
            ThreePointArc((-93.8029384744, -16.5399889228), (-94.1414338721, -14.4897525346), (-94.4351230459, -12.432619809))
        make_face()
    extrude(amount=F16_DEPTH)


solid = Compound([f1.part, f11.part])
